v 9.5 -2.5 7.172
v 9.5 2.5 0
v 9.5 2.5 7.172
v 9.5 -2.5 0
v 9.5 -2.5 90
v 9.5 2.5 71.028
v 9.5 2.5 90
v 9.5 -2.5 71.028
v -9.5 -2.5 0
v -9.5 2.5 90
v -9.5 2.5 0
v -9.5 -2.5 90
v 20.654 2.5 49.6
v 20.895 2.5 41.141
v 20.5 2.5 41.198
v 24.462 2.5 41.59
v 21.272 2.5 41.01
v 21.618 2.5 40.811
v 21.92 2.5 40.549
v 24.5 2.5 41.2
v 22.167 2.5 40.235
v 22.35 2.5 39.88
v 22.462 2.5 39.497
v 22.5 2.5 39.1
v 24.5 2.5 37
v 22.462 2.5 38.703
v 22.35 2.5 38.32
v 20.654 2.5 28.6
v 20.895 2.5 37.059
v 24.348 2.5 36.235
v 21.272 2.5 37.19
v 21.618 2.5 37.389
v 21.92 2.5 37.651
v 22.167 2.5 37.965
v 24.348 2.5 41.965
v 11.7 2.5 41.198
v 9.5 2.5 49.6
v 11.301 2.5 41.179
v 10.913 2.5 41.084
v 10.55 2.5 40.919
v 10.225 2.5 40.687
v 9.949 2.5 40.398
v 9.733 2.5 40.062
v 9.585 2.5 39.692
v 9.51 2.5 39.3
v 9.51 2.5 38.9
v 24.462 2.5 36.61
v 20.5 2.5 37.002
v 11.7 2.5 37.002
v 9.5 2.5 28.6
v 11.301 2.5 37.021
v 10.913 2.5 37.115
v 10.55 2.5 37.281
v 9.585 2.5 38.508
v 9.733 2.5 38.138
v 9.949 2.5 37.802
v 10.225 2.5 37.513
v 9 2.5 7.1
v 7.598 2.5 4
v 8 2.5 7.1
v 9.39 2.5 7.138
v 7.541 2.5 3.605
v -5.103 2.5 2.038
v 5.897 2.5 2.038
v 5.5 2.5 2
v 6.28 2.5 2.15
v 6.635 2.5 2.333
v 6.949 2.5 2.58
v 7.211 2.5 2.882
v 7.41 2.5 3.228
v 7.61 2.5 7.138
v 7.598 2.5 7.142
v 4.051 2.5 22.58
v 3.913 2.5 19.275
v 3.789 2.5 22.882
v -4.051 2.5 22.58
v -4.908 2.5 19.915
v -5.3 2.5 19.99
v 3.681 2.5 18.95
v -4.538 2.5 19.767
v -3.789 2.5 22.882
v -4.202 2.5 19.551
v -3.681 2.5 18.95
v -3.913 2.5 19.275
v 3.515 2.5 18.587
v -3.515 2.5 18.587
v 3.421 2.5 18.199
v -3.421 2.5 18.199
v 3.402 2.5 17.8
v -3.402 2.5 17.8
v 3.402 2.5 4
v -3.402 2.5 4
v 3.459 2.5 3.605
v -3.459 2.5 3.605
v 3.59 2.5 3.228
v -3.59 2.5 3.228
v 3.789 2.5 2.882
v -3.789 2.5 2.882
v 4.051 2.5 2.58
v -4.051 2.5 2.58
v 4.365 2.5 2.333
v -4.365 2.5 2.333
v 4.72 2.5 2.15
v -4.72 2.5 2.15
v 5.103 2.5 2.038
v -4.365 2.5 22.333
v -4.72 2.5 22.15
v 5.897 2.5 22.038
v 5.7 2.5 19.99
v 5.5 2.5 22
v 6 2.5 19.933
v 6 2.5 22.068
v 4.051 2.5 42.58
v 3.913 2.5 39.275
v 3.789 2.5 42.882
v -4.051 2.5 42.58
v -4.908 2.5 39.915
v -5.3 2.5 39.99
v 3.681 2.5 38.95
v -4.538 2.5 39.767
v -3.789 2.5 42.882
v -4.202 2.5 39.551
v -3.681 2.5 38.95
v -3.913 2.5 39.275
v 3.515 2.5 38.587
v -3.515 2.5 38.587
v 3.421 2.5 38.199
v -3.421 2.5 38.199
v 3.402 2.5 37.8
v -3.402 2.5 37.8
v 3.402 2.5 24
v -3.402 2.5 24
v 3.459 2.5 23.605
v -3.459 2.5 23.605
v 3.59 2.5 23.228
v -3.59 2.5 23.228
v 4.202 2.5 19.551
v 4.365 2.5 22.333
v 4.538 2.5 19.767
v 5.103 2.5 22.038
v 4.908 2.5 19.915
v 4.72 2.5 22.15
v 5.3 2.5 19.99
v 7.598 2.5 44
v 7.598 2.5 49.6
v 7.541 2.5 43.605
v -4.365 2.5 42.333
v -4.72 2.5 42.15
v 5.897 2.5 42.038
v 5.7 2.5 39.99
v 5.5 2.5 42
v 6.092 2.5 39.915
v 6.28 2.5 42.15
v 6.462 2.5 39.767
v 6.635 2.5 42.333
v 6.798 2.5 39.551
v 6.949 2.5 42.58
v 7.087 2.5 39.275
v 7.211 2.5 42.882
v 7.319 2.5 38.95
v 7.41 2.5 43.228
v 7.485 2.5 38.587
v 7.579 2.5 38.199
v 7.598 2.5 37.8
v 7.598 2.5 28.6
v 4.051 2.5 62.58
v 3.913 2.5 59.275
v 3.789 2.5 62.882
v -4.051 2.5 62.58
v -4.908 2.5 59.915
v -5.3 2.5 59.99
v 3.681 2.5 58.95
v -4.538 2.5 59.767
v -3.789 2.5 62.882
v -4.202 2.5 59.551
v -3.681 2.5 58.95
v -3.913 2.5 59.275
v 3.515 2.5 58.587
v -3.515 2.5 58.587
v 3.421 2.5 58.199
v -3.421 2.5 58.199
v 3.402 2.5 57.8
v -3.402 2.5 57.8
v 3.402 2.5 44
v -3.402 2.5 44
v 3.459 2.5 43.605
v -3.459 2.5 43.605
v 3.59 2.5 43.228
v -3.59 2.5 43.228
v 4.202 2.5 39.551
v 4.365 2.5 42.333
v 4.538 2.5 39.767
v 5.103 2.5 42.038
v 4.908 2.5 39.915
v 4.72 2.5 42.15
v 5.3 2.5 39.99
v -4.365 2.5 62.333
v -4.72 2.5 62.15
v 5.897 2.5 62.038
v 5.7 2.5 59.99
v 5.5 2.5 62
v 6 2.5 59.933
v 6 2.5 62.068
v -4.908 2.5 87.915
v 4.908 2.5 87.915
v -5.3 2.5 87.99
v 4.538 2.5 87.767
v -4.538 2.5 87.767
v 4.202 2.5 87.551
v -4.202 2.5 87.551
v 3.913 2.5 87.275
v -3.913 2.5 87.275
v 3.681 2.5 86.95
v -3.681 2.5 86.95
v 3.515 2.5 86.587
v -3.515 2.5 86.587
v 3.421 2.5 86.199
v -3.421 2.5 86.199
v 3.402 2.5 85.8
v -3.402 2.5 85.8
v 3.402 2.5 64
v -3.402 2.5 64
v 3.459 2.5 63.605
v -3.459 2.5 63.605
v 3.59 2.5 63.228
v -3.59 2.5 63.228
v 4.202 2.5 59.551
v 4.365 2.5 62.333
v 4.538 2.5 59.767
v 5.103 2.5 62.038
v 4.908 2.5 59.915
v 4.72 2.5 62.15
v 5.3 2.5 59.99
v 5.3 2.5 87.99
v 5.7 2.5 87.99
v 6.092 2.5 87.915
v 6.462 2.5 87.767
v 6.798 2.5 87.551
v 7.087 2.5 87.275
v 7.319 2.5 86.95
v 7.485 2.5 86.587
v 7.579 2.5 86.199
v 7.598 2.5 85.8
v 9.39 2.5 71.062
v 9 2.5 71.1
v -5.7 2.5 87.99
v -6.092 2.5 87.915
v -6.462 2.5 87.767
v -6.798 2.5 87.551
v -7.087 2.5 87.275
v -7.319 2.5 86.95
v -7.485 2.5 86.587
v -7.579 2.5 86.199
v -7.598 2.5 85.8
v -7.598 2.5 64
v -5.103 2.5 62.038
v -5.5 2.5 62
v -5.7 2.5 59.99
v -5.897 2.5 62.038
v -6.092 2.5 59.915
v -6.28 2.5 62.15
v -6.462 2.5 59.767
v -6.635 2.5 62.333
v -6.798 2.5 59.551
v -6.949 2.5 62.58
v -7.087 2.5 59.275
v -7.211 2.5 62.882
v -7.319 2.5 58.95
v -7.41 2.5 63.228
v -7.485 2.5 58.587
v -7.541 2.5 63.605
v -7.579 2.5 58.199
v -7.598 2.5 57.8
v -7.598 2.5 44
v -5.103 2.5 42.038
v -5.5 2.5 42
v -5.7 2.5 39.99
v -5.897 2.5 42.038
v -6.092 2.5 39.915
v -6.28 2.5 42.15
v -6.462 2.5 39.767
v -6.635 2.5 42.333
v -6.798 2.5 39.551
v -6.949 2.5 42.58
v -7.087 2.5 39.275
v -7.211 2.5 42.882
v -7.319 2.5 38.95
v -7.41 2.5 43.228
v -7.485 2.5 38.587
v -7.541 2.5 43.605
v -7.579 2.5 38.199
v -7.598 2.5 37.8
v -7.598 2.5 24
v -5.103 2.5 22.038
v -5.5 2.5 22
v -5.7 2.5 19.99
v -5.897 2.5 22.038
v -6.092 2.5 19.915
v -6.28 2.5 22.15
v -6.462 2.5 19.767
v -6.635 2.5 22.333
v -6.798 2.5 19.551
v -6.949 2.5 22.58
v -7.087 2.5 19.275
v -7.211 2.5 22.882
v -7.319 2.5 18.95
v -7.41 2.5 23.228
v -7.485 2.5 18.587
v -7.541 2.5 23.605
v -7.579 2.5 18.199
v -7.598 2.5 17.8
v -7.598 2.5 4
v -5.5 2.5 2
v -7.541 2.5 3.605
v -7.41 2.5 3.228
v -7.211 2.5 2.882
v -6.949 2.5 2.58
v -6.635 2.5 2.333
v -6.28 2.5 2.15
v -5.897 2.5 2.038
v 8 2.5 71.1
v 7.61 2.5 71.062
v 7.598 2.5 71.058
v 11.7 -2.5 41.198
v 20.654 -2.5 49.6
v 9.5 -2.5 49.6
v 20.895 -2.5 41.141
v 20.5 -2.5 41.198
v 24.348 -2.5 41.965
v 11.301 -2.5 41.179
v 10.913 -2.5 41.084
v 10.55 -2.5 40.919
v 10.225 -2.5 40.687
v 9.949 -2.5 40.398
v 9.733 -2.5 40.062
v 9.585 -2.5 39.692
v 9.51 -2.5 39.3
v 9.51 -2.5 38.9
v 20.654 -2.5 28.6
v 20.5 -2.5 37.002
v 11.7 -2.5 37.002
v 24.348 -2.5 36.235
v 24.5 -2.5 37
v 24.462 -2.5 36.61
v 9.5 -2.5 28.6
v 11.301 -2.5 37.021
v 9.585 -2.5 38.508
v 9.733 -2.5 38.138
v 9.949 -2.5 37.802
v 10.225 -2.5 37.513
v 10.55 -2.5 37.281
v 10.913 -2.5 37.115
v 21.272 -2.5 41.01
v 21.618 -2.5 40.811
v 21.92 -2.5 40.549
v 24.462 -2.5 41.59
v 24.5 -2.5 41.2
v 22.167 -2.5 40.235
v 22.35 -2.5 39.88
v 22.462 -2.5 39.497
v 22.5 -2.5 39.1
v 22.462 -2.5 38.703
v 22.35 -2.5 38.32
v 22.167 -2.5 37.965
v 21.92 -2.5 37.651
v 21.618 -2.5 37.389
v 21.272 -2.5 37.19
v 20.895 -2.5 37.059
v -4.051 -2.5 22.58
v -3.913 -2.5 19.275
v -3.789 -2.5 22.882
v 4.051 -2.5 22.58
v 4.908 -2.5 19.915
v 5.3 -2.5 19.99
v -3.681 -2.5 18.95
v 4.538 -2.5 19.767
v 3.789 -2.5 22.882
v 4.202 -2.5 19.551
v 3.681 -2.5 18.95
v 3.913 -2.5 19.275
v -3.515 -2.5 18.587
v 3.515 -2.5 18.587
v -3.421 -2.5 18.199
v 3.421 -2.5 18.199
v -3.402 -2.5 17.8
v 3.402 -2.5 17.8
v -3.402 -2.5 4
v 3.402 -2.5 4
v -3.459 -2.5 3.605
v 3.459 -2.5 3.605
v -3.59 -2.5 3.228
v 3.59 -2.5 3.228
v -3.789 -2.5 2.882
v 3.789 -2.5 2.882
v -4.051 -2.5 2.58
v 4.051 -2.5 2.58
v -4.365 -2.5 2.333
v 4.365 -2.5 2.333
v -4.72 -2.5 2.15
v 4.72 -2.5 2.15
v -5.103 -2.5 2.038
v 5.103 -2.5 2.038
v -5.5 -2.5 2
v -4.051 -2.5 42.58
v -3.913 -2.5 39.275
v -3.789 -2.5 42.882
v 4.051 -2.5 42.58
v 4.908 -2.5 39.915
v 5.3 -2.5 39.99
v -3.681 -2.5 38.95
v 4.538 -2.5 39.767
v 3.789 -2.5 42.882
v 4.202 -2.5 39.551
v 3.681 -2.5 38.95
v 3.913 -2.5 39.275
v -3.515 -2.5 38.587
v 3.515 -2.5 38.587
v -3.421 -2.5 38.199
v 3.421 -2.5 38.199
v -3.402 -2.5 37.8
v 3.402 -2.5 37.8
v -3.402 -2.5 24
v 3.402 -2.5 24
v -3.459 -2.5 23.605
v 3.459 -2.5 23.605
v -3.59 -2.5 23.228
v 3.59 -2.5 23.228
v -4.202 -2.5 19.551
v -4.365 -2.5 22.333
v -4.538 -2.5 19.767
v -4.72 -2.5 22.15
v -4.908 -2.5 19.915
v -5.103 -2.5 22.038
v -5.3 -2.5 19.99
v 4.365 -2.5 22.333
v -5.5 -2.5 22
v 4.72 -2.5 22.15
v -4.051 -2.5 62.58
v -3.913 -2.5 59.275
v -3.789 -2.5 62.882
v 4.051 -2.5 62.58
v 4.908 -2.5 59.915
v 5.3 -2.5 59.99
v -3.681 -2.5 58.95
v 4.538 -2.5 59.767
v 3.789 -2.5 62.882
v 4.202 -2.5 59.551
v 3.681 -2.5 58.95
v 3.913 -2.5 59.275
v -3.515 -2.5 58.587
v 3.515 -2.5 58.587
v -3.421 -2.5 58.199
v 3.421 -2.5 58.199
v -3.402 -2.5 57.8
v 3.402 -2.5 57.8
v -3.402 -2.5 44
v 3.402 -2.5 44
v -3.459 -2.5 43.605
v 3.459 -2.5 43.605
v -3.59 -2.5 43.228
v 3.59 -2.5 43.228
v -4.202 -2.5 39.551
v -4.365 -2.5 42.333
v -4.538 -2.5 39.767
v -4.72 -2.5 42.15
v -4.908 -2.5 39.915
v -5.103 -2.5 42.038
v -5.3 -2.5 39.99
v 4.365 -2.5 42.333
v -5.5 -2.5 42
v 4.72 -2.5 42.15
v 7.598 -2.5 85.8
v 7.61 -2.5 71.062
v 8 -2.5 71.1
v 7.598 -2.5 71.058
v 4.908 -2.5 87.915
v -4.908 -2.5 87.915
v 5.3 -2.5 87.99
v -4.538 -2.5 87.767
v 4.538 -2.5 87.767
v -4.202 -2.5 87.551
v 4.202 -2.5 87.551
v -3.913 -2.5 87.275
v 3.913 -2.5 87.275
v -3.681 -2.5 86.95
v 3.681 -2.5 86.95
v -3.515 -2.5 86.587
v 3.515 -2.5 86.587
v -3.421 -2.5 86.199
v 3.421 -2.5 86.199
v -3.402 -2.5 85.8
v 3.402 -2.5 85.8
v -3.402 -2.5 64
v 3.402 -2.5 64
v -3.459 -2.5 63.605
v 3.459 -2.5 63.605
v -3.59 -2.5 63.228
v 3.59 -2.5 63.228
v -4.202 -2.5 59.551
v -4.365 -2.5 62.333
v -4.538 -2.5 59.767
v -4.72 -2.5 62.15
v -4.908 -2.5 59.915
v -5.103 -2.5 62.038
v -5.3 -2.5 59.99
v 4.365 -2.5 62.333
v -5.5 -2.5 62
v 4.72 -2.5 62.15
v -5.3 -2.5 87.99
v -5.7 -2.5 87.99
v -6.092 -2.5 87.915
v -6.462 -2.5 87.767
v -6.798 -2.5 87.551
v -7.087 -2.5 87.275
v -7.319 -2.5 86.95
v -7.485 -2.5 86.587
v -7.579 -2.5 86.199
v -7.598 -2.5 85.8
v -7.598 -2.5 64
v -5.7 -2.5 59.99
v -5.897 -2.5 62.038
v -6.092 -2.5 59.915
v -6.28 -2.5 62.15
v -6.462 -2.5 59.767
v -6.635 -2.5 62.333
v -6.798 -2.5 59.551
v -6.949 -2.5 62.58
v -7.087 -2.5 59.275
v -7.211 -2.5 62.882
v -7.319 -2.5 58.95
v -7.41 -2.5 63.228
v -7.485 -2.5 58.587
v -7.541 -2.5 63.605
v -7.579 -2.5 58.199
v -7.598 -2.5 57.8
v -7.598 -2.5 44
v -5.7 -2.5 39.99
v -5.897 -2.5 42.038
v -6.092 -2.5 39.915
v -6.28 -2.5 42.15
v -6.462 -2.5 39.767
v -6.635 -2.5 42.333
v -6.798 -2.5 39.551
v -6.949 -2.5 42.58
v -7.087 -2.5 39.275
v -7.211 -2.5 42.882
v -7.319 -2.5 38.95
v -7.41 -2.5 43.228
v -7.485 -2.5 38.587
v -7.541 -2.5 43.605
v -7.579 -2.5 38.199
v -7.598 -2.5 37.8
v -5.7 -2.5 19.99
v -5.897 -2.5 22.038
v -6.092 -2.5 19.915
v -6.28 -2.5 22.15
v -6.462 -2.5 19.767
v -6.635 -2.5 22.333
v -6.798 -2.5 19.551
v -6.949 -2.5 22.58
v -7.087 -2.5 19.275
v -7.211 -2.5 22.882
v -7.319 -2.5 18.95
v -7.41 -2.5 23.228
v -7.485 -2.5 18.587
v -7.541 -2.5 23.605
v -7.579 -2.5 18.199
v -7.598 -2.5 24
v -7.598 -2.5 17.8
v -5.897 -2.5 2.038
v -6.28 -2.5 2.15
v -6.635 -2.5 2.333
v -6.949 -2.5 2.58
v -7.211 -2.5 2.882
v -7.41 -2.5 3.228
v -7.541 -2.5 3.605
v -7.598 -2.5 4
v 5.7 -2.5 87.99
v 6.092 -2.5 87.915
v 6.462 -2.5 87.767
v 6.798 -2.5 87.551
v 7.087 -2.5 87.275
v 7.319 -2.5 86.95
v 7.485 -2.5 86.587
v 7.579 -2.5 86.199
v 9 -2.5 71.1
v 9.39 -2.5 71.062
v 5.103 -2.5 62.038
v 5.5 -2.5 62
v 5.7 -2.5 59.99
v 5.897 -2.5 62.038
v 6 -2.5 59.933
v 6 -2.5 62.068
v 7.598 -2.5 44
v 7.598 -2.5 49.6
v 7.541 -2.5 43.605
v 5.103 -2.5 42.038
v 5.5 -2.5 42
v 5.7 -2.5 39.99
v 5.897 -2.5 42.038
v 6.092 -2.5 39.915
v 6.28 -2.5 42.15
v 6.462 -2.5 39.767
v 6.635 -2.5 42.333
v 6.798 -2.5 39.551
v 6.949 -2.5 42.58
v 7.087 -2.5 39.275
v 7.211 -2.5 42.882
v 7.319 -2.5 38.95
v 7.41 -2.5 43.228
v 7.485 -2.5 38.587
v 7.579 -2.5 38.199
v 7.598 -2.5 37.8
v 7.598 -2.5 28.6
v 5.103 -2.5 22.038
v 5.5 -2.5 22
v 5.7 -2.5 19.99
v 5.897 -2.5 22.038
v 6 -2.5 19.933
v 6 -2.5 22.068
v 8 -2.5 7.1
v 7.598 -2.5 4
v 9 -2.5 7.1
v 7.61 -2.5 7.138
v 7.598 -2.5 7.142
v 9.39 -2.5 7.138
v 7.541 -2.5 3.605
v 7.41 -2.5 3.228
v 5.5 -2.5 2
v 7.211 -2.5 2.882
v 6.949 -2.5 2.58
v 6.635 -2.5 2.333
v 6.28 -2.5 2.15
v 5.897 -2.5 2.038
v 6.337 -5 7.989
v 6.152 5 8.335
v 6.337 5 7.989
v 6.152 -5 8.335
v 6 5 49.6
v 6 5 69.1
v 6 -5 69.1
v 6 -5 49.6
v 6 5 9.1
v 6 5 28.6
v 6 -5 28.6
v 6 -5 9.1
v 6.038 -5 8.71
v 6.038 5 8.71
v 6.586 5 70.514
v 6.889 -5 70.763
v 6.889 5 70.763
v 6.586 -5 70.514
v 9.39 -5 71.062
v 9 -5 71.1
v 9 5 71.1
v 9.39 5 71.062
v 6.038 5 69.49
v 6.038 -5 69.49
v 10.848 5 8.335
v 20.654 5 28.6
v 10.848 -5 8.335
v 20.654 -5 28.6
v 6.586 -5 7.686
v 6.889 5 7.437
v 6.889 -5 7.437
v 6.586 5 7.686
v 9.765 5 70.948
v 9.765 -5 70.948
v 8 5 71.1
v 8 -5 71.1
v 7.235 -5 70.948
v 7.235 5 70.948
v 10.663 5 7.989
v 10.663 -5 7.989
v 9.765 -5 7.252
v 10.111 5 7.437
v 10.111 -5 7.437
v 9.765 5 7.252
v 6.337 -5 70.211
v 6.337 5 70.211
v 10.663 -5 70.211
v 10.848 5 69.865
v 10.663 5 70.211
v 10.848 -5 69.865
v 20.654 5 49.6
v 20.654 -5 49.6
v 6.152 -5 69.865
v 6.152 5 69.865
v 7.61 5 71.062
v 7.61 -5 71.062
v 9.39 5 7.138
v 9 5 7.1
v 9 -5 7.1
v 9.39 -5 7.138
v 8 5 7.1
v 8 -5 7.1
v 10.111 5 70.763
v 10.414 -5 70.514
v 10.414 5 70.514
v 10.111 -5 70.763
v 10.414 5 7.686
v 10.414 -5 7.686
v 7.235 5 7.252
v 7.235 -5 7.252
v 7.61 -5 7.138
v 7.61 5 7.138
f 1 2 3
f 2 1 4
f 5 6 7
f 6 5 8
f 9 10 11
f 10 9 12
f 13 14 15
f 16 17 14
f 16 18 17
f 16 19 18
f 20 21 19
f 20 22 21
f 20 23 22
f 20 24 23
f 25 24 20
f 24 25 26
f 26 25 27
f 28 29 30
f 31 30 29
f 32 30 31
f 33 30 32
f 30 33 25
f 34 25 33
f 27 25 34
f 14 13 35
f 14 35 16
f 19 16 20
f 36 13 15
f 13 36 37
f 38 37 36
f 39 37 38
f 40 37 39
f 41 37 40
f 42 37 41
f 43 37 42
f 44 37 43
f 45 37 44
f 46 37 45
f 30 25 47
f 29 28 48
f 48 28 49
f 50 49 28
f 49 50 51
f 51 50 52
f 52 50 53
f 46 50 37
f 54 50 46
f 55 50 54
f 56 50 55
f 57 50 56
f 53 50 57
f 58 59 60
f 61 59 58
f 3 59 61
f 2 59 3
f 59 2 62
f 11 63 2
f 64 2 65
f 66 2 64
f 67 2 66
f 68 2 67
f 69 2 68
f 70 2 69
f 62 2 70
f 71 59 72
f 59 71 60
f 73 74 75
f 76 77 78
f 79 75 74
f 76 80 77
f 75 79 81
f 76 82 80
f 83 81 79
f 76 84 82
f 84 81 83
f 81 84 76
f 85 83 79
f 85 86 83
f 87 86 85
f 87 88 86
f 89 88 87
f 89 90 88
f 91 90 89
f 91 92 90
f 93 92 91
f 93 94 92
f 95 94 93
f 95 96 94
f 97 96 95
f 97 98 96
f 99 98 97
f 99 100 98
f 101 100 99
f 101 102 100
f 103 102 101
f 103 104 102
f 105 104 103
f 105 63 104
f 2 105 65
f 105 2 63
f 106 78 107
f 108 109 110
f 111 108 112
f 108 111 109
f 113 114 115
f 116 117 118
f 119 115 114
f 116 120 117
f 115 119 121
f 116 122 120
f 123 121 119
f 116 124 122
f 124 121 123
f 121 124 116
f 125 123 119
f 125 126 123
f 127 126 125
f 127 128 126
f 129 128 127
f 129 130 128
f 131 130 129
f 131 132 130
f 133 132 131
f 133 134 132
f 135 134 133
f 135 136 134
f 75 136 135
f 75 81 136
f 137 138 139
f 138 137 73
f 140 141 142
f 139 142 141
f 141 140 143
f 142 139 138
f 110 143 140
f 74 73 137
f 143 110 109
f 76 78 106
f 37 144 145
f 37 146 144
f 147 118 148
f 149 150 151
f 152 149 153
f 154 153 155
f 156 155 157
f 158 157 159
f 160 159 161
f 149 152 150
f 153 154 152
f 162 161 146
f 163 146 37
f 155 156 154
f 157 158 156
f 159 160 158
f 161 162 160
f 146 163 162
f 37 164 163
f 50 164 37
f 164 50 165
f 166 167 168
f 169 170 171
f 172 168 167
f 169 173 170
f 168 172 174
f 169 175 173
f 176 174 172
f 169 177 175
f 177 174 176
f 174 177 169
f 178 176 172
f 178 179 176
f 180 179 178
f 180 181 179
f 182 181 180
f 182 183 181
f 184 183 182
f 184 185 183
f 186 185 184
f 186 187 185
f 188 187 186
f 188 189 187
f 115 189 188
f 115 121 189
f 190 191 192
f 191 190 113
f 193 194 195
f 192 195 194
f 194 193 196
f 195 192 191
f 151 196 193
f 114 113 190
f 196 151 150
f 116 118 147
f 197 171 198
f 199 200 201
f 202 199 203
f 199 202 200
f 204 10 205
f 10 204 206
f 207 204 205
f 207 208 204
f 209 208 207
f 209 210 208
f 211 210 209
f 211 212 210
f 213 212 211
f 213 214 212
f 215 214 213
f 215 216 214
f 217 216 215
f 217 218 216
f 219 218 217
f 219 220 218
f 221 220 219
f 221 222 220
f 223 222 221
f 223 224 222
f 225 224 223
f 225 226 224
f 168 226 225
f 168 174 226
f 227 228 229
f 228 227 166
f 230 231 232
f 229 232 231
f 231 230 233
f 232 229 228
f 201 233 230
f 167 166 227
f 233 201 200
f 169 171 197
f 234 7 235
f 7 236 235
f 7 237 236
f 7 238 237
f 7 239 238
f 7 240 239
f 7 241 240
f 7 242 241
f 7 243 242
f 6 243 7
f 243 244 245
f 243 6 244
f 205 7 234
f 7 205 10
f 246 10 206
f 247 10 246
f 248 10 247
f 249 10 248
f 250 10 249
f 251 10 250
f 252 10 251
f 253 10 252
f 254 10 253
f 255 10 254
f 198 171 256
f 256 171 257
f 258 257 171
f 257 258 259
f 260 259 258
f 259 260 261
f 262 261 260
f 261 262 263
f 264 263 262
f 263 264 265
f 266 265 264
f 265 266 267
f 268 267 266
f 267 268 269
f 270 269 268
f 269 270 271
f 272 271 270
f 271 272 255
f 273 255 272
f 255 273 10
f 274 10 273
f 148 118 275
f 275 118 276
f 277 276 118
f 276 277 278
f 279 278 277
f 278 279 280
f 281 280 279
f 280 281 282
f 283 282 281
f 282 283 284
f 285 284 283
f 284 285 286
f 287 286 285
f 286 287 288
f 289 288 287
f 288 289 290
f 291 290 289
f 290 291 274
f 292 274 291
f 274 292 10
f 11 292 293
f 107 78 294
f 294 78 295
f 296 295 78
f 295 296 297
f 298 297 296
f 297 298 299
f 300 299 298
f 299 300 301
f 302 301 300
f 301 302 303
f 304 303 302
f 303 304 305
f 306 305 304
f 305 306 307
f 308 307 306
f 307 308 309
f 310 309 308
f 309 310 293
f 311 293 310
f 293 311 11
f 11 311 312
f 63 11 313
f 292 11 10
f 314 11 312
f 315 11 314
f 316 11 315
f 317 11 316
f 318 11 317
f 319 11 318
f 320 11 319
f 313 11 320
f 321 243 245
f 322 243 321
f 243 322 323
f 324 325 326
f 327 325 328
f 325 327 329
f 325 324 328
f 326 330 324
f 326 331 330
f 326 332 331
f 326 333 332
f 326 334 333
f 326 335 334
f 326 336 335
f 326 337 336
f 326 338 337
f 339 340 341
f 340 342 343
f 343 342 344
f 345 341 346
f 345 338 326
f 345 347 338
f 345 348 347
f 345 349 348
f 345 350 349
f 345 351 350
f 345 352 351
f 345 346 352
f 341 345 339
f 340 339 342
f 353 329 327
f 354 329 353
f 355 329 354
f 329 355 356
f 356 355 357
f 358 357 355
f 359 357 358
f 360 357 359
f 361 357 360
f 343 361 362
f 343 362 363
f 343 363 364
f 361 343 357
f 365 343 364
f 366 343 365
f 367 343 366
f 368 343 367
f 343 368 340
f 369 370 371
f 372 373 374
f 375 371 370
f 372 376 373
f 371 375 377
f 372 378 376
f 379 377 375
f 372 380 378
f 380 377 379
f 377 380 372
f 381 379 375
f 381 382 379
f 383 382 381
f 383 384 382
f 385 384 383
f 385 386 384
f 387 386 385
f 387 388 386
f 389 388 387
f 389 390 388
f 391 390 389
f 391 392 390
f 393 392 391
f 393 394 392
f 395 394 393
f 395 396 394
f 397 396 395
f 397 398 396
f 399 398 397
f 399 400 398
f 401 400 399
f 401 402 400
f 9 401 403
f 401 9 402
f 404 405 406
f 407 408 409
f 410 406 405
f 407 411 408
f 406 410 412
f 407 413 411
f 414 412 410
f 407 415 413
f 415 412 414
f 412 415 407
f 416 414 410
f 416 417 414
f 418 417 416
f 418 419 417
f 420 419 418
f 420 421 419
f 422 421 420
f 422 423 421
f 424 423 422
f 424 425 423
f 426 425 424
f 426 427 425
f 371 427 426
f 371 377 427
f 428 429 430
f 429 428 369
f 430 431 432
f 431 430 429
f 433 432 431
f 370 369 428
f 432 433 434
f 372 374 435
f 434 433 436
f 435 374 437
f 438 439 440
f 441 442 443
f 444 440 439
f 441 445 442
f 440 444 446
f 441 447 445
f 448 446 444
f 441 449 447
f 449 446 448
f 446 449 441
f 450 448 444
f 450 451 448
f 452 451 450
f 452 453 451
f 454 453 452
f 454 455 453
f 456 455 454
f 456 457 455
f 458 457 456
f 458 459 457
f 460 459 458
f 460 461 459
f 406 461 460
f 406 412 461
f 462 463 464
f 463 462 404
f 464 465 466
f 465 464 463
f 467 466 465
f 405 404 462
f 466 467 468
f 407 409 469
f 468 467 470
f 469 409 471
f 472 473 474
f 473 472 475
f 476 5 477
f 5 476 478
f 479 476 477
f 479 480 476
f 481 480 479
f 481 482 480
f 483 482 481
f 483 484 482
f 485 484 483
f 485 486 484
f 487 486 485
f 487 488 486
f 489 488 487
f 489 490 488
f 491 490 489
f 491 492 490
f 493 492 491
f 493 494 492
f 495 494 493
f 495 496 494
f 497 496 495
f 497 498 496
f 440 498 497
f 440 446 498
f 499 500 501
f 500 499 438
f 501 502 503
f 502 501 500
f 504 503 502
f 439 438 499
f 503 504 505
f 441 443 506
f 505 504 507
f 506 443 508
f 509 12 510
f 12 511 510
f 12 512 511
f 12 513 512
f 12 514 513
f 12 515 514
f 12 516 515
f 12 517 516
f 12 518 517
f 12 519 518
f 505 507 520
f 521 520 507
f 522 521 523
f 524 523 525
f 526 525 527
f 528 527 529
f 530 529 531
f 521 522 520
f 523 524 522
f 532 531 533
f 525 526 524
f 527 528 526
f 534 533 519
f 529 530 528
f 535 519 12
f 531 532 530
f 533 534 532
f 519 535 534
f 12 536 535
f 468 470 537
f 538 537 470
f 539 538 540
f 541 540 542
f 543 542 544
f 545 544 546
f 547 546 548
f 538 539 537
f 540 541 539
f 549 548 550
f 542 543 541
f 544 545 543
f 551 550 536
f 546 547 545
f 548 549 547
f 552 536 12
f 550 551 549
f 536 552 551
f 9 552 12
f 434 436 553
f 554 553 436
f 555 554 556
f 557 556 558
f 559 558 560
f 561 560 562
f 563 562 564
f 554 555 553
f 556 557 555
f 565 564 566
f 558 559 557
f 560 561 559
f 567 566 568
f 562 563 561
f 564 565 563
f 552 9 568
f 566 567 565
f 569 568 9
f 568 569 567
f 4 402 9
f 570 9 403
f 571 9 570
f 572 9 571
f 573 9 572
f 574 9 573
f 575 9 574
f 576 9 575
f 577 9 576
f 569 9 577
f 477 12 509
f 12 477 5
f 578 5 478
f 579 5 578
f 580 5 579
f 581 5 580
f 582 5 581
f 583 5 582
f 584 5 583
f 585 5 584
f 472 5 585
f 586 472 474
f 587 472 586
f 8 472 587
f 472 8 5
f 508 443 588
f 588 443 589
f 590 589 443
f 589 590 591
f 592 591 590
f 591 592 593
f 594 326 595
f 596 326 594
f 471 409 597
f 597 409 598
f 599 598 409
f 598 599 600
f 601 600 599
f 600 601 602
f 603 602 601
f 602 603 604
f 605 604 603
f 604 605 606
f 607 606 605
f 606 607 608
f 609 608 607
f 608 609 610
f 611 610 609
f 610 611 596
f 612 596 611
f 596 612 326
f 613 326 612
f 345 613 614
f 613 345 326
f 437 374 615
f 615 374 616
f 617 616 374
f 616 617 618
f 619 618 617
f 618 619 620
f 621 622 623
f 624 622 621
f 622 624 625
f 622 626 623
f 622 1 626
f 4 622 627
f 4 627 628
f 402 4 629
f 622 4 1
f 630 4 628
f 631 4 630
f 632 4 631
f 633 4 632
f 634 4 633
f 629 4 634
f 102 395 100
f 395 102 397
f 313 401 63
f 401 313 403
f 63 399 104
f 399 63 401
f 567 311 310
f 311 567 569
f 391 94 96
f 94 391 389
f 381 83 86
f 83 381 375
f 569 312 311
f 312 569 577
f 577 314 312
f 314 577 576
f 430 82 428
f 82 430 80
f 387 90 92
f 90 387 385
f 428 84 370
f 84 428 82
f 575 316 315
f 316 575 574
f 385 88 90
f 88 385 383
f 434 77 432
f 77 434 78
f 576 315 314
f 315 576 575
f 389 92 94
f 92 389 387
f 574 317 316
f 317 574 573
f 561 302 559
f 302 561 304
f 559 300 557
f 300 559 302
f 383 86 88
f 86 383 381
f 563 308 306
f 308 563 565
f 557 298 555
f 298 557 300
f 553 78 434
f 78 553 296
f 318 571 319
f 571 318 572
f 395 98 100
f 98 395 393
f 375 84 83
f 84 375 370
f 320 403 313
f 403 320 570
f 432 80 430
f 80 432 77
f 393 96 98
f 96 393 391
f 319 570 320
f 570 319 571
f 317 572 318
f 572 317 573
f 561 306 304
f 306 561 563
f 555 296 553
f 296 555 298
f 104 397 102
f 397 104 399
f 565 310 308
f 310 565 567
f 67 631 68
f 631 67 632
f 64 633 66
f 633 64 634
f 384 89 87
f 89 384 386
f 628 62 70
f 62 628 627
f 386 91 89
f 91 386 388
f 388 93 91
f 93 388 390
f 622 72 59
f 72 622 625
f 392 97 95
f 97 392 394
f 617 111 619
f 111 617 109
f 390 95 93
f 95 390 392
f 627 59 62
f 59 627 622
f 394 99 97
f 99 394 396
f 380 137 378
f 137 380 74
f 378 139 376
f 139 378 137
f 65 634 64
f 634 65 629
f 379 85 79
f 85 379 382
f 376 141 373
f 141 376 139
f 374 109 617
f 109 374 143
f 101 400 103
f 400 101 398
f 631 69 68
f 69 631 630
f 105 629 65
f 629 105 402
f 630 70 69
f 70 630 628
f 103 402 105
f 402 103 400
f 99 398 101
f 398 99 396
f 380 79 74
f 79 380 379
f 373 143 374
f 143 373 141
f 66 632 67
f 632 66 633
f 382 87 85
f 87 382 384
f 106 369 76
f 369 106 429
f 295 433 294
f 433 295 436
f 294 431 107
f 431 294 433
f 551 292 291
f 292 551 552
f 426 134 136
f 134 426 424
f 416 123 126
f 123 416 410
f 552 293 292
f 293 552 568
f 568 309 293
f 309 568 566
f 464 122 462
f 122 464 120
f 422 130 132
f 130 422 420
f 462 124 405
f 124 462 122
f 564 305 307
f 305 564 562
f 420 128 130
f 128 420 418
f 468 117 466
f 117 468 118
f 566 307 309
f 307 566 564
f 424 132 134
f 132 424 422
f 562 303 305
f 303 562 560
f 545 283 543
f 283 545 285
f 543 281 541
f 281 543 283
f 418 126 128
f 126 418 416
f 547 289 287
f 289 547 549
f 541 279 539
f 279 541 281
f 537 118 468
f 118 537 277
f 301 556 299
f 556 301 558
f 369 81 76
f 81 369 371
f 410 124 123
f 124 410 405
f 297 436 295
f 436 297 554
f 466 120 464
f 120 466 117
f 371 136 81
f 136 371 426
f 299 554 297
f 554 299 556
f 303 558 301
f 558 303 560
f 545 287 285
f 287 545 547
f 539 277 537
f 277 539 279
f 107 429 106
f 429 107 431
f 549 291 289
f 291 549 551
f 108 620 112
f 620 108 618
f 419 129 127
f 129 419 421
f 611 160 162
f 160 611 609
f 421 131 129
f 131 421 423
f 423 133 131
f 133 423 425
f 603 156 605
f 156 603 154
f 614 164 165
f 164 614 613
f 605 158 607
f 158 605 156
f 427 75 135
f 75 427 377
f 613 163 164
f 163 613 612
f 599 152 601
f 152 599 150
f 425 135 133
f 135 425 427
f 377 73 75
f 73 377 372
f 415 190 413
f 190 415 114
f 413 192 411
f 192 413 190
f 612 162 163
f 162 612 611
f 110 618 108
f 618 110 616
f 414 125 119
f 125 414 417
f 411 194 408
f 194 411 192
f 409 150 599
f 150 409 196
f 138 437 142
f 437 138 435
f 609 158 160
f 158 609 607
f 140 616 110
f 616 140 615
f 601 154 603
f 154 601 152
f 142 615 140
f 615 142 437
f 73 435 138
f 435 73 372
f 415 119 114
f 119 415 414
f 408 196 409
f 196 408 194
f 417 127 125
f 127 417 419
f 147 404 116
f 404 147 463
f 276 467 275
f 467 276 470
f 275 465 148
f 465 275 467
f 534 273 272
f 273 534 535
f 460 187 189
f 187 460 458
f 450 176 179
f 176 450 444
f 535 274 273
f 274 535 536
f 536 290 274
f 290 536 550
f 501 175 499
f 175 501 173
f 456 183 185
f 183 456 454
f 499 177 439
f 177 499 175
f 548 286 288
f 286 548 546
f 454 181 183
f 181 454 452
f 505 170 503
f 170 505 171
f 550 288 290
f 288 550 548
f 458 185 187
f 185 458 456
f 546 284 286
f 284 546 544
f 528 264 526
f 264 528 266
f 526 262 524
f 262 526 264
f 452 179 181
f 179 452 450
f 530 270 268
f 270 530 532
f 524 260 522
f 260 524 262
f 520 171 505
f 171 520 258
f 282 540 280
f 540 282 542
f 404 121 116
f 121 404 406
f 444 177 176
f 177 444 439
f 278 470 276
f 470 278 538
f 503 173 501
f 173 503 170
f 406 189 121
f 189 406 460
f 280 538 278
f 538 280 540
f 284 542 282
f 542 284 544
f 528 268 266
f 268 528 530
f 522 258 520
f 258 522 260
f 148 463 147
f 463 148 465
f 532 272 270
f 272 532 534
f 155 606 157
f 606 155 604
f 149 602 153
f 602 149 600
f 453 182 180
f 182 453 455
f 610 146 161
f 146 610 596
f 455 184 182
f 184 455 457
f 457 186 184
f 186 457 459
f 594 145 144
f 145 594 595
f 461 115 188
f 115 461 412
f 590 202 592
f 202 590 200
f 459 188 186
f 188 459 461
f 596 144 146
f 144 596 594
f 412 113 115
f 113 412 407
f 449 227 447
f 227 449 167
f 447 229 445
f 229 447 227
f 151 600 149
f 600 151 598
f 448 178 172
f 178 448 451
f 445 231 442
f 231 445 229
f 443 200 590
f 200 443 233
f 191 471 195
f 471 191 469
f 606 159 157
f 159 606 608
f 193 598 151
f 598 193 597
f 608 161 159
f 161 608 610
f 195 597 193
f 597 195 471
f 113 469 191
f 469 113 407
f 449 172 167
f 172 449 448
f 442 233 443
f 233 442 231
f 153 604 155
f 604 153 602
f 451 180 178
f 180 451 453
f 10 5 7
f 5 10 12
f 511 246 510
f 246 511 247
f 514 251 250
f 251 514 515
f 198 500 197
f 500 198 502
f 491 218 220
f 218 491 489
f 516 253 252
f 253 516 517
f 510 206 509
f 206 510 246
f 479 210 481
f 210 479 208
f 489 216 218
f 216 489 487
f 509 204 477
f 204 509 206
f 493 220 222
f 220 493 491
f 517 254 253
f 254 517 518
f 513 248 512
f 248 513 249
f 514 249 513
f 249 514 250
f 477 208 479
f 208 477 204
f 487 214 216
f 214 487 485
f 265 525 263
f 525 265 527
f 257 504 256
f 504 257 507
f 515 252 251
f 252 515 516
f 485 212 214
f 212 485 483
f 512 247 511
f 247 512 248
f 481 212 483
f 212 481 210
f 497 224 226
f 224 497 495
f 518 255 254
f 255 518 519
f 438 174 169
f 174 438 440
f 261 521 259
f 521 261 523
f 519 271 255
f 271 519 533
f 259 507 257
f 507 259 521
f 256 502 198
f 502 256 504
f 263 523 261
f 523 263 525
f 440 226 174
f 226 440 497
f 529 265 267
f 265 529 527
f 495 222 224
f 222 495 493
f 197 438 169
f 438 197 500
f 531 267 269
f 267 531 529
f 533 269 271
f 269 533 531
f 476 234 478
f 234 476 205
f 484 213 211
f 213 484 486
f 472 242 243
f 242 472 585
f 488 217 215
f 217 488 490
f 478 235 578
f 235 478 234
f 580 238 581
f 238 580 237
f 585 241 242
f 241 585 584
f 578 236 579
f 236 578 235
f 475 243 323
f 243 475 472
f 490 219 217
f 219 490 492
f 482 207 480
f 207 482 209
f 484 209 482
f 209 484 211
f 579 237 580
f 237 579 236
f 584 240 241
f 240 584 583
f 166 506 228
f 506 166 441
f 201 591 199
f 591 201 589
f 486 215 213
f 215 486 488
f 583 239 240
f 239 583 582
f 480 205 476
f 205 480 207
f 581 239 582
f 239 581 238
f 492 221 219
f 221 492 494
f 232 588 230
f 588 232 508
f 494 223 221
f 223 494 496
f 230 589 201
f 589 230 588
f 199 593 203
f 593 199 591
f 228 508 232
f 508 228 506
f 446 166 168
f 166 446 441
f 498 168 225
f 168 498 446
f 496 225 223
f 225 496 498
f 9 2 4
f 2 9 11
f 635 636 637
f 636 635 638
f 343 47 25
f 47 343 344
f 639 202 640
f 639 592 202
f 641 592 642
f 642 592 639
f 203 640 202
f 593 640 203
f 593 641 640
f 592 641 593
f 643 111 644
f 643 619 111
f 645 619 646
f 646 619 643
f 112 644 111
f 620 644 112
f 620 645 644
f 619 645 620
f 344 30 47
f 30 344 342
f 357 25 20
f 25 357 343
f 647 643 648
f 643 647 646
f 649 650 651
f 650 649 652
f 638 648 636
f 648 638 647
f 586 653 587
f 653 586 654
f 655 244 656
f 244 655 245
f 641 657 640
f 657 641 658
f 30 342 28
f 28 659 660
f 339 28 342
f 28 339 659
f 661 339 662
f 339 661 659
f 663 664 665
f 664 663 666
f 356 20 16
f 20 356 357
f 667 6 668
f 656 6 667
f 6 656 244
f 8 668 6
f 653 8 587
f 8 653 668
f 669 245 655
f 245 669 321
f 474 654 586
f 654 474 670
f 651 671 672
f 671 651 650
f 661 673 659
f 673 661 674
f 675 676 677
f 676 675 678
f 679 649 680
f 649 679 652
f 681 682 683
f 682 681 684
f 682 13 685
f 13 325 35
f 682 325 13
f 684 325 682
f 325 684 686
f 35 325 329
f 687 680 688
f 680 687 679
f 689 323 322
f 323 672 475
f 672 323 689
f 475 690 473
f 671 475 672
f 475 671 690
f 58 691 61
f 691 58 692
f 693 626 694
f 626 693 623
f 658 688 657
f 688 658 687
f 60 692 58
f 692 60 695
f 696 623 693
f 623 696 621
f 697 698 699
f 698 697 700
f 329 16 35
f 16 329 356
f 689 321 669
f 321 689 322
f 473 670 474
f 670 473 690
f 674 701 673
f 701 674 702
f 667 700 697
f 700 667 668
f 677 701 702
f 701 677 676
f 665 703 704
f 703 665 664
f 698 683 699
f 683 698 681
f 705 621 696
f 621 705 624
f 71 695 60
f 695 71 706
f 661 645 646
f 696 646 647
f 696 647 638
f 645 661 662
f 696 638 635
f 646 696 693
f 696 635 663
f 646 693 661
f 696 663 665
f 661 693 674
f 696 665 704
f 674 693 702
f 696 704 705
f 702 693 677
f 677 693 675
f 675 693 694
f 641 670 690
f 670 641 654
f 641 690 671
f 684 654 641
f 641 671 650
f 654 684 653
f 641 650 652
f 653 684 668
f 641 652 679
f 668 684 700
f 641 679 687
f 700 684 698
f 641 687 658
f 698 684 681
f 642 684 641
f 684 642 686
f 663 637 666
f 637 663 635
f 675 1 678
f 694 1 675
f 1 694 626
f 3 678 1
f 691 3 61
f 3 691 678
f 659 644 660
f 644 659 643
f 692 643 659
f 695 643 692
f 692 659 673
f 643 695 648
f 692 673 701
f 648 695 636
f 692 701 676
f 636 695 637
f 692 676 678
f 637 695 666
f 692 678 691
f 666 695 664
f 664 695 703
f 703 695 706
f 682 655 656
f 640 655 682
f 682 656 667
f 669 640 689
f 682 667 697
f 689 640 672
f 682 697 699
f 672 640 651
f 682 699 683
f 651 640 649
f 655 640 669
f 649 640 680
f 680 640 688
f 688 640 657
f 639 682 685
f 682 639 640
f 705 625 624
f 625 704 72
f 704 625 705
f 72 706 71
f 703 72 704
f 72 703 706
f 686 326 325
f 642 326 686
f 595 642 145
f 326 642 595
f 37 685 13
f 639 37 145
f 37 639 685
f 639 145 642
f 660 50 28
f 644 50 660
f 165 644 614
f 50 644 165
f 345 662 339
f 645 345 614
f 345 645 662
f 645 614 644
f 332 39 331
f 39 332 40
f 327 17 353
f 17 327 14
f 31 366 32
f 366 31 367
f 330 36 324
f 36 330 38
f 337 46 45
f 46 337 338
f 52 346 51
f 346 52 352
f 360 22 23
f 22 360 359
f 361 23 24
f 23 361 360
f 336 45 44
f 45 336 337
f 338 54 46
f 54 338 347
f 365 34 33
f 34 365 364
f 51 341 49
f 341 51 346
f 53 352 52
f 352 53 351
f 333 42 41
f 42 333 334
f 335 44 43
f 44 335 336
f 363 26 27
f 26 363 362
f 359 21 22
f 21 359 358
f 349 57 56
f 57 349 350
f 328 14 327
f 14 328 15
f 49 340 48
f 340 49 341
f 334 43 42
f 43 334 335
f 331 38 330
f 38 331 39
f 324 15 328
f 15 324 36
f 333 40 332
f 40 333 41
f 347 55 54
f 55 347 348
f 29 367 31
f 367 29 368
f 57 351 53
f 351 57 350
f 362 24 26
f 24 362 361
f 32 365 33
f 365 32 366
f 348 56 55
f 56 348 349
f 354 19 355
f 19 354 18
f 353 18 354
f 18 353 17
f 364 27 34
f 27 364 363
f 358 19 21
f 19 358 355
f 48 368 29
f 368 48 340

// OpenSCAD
/* Begin suggested config */
total_height = 70; // total screw travel. Outer actual will be a little bigger.
depth = 5; // want to be kinda thick so it doesn't move

// If false, remainder is a small segment on top
// If true, top segment is stretched to fill space.
remainder_fill = true; 

screw_distance = 11;
screw_hole_d = 4.2;

track_length = 18;
track_spacing = 2;
frame_width = 19; // 2020 frame is 20mm wide

offshoot=true;
offshoot_track=13;
offshoot_padding = 0;
offshoot_round = 4;
offshoot_z_offset = 30+ (track_length/2) - track_spacing + (offshoot_padding/2);
offshoot_x_offset = 0;

/* end config */


$fa = 1;
$fs = 0.4;
fudge = 0.001;


panel_segment_height = (track_length + track_spacing);
// -track_spacing because we always put a block of 1 track_spacing at the bottom
normal_panel_count = floor((total_height - track_spacing) / panel_segment_height);
// panel_remainder does not have track_spacing included.
panel_remainder = (total_height - track_spacing) - (normal_panel_count * panel_segment_height) - track_spacing;
min_panel_height = (track_spacing + screw_hole_d) + 0.1;
echo("normal_panel_count", normal_panel_count);
echo("remainder", panel_remainder);
echo("min_panel_height", min_panel_height);

// If there's not enough space for an independent remainder section, we forcefully fill it.
do_remainder_fill = (panel_remainder > min_panel_height) ? remainder_fill : true;
if (do_remainder_fill != remainder_fill) {
    echo("WARNING: Not enough space, forcing remainder_fill = true");
}

/* BEGIN */




union(){
    all_panels();
    
    // !! nothing makes sense past this point !!
    if (offshoot) {
        //use_offshoot_padding = max(offshoot_padding, offshoot_round);
        use_offshoot_padding = offshoot_padding;
        go_offshoot_x = ((frame_width/2)+((offshoot_track + use_offshoot_padding)/2)) + offshoot_x_offset;
        go_offshoot_z = ((screw_hole_d + use_offshoot_padding)/2) + offshoot_z_offset;
        translate([go_offshoot_x, 0, go_offshoot_z]){
            difference() {
                minkowski() {
                    // pointy thing
                    hull(){
                        cube([offshoot_track + use_offshoot_padding, depth, screw_hole_d + use_offshoot_padding], center=true);
                        
                        translate([((offshoot_track + use_offshoot_padding)/-2)-1, 0, 0])
                            cube([1, depth, min((offshoot_z_offset*2)-(offshoot_round/2), 60)], center=true);
                    }
                    
                    // cylinder for smooth edges. Adjust diameter for more smooth;
                    translate([0, 0, 0])
                        rotate([90, 0, 0])
                        cylinder(h=depth, d=offshoot_round, center=true);
                }
                
                // cubes to slice off the extra from minkowski
                chop=(offshoot_track + use_offshoot_padding) + (offshoot_round*2);
                translate([0,(chop/2) + (depth/2), 0])
                    cube([chop, chop, chop], center=true);
                translate([0,(chop/-2) + (depth/-2), 0])
                    cube([chop, chop, chop], center=true);
                translate([((offshoot_track + use_offshoot_padding)/-2)-(chop/2)-0.5, 0, 0])
                    cube([chop, chop, chop], center=true);
                
                
                // puts the hole in it
                hull()
                    screw_holes(offshoot_track - screw_hole_d, screw_hole_d, depth, vertical=false);
            }
        }
    }
    
}

module all_panels() {
    // Align btm of all_panels to Z=0
    translate([0, 0, (panel_segment_height/2) + track_spacing])
    union() {
        for(i = [0 : (normal_panel_count - (do_remainder_fill ? 1 : 0))]) {
            translate([0, 0, (panel_segment_height*i)])
                panel();
        }
        if (do_remainder_fill) {
            btm_align = panel_remainder/2 + track_spacing/2;
            remainder_offset = btm_align + (panel_segment_height*normal_panel_count);
            // need to include track_spacing because there would be an extra spacer here
            translate([0, 0, remainder_offset])
                panel(panel_segment_height + panel_remainder);
        }
        else {
            btm_align = -((panel_segment_height/2)-(panel_remainder/2 + track_spacing/2));
            remainder_offset = btm_align + (panel_segment_height*(normal_panel_count+1));
            translate([0, 0, remainder_offset])
                panel(panel_remainder);
        }
        // little extra piece at the bottom
        translate([0, 0, (panel_segment_height/-2) + (track_spacing/-2)])
            cube([frame_width, depth, track_spacing], center=true);
    }
    
}

module panel(want_track_length = track_length) {
    
    new_track_len = want_track_length - screw_hole_d;
    // new_height should be == panel_segment_height with defaults
    new_height = want_track_length + track_spacing;
    mv_down = track_spacing/-2;
    
    difference() {
        cube([frame_width, depth, new_height], center=true);
        
        translate([screw_distance/-2, 0, mv_down])
            hull()
            screw_holes(new_track_len, screw_hole_d, depth, vertical=true);
        translate([screw_distance/2, 0, mv_down])
            hull()
            screw_holes(new_track_len, screw_hole_d, depth, vertical=true);
        
    }
}

module screw_holes(distance, diameter, wall, vertical=true) {
    //translate([0, 0, (switch_height/2) - (switch_screw_hole_d/2) - (wall/2)])
    rotate(vertical ? 90 : 0, [0, 1, 0])
    for (s = [-2:4:2]) {
        translate([distance/s, 0, 0])
        rotate([90, 0, 0])
        cylinder(wall*4, d=diameter, center=true);
    }
}

/*

wall = 3;


frame_screw_distance = 11;
frame_screw_hole_d = 4.2;
frame_width = max(17, frame_screw_hole_d + wall); // 2020 frame is 20mm wide
frame_height = frame_screw_distance + frame_screw_hole_d + wall;

switch_screw_distance = 11;
switch_screw_hole_d = 4;
switch_width = max(17, switch_screw_distance + switch_screw_hole_d + wall);
switch_height = 67; // total outside, screw guides will be smaller
switch_extra_width = wall*2; // for support
switch_screw_offset_bottom = wall;

switch_screw_guide_length = switch_height - wall - switch_screw_hole_d - switch_screw_offset_bottom;


union() {
    // frame
    translate([switch_width/2 + frame_width/2, 0, 0])
    difference() {
        cube([frame_width, wall, frame_height], center=true);
        
        screw_holes(frame_screw_distance, frame_screw_hole_d, vertical=true);
    }


    // vert
    translate([0, 0, switch_height/2 - frame_height/2])    
    difference() {
        cube([switch_width + switch_extra_width, wall, switch_height], center=true);
        
        for (v = [-1:2:1]) {
            translate([(switch_screw_distance / 2) * v, 0, switch_screw_offset_bottom/2])
            hull()
            screw_holes(switch_screw_guide_length, switch_screw_hole_d, vertical=true);
        }
    }
    
}

module screw_holes(distance, diameter, vertical=true) {
    //translate([0, 0, (switch_height/2) - (switch_screw_hole_d/2) - (wall/2)])
    rotate(vertical ? 90 : 0, [0, 1, 0])
    for (s = [-2:4:2]) {
        translate([distance/s, 0, 0])
        rotate([90, 0, 0])
        cylinder(wall*4, d=diameter, center=true);
    }
}
*/
